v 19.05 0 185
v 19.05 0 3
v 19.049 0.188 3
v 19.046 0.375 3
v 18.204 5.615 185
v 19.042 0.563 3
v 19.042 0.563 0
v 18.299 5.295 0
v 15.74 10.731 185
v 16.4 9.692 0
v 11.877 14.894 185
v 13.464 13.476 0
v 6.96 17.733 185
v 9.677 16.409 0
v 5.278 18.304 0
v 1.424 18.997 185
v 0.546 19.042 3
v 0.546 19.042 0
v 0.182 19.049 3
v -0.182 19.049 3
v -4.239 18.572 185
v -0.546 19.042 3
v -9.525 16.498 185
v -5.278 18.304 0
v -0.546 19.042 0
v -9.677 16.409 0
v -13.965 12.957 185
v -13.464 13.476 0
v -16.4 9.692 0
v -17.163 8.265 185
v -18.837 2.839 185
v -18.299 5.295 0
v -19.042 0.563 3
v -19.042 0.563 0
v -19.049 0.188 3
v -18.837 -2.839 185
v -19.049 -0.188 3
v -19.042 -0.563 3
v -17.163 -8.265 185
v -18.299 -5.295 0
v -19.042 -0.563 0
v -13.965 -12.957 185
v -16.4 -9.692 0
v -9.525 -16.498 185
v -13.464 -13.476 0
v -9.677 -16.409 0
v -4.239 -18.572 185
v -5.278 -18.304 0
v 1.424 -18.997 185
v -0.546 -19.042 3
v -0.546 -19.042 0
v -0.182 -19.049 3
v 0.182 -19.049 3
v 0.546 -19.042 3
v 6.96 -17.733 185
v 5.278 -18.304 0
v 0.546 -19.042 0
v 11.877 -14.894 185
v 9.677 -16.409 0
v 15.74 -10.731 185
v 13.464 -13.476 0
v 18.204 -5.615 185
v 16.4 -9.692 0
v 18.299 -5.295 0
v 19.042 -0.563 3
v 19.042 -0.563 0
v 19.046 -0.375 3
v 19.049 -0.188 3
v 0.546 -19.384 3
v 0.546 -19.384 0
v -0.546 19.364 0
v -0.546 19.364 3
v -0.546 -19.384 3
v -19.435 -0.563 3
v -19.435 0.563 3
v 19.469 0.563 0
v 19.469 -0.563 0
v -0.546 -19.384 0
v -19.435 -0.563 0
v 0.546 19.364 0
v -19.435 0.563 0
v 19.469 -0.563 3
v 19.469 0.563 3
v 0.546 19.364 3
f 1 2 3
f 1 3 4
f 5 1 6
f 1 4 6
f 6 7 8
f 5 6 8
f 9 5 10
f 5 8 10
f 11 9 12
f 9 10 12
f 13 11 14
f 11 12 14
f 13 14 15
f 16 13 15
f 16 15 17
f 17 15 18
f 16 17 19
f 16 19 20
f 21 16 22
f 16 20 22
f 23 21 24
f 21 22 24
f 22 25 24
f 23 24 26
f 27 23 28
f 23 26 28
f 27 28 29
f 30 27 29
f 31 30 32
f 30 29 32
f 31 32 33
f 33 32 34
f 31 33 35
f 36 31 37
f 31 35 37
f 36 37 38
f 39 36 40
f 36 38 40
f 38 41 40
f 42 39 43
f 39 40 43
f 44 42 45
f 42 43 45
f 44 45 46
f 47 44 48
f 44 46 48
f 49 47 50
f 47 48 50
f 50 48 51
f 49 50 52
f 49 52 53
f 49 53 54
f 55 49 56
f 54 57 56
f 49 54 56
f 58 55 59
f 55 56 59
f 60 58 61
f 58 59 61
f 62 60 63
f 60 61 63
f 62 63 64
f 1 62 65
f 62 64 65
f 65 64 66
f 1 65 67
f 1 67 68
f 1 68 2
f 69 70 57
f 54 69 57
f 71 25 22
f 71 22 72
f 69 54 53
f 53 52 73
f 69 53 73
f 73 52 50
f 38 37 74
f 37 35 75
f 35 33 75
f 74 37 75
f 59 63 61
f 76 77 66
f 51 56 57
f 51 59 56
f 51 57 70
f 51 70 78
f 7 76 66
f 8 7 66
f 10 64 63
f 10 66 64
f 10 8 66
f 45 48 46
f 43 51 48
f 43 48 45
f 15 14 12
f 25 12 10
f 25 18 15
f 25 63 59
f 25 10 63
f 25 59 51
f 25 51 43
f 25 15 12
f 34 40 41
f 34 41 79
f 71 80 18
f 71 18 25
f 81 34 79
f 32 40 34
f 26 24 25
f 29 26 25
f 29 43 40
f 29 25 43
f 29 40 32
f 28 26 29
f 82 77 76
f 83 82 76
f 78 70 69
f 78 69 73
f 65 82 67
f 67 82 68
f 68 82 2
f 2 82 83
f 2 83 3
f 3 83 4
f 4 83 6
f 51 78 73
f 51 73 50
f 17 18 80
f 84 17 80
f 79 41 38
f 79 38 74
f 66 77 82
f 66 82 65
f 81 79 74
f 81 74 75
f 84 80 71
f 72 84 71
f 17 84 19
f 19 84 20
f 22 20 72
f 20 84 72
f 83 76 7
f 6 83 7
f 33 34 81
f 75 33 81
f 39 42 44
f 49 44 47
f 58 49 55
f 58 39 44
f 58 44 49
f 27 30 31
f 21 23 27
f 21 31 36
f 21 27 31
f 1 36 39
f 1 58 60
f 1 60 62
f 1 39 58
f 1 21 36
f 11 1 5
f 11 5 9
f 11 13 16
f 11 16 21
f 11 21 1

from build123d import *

# Parameters (mm, degrees)
CROQUIS1_R              = 19.05
SALIENTE_EXTRUIR1_DEPTH = 185
CROQUIS2_W              = 0.838589864
CROQUIS2_H              = 1.125731298
CROQUIS2_W_2            = 0.770363726
CROQUIS2_W_3            = 1.091618228
CROQUIS2_H_2            = 0.62827213
CROQUIS2_H_3            = 0.668024516
SALIENTE_EXTRUIR2_DEPTH = 3


with BuildPart() as part:
    # Croquis1 → Saliente-Extruir1 (new body)
    with BuildSketch(Plane.XY):
        Circle(CROQUIS1_R)
    extrude(amount=SALIENTE_EXTRUIR1_DEPTH)

    # Croquis2 → Saliente-Extruir2 (add)
    with BuildSketch(Plane(origin=(0, 0, 0), x_dir=(-1, 0, 0), z_dir=(0, 0, -1))):
        with Locations((-19.05, 0)):
            Rectangle(CROQUIS2_W, CROQUIS2_H)
        with Locations((19.05, 0)):
            Rectangle(CROQUIS2_W_2, CROQUIS2_H)
        with Locations((0, 19.05)):
            Rectangle(CROQUIS2_W_3, CROQUIS2_H_2)
        with Locations((0, -19.05)):
            Rectangle(CROQUIS2_W_3, CROQUIS2_H_3)
    extrude(amount=-SALIENTE_EXTRUIR2_DEPTH)


solid = part.part
